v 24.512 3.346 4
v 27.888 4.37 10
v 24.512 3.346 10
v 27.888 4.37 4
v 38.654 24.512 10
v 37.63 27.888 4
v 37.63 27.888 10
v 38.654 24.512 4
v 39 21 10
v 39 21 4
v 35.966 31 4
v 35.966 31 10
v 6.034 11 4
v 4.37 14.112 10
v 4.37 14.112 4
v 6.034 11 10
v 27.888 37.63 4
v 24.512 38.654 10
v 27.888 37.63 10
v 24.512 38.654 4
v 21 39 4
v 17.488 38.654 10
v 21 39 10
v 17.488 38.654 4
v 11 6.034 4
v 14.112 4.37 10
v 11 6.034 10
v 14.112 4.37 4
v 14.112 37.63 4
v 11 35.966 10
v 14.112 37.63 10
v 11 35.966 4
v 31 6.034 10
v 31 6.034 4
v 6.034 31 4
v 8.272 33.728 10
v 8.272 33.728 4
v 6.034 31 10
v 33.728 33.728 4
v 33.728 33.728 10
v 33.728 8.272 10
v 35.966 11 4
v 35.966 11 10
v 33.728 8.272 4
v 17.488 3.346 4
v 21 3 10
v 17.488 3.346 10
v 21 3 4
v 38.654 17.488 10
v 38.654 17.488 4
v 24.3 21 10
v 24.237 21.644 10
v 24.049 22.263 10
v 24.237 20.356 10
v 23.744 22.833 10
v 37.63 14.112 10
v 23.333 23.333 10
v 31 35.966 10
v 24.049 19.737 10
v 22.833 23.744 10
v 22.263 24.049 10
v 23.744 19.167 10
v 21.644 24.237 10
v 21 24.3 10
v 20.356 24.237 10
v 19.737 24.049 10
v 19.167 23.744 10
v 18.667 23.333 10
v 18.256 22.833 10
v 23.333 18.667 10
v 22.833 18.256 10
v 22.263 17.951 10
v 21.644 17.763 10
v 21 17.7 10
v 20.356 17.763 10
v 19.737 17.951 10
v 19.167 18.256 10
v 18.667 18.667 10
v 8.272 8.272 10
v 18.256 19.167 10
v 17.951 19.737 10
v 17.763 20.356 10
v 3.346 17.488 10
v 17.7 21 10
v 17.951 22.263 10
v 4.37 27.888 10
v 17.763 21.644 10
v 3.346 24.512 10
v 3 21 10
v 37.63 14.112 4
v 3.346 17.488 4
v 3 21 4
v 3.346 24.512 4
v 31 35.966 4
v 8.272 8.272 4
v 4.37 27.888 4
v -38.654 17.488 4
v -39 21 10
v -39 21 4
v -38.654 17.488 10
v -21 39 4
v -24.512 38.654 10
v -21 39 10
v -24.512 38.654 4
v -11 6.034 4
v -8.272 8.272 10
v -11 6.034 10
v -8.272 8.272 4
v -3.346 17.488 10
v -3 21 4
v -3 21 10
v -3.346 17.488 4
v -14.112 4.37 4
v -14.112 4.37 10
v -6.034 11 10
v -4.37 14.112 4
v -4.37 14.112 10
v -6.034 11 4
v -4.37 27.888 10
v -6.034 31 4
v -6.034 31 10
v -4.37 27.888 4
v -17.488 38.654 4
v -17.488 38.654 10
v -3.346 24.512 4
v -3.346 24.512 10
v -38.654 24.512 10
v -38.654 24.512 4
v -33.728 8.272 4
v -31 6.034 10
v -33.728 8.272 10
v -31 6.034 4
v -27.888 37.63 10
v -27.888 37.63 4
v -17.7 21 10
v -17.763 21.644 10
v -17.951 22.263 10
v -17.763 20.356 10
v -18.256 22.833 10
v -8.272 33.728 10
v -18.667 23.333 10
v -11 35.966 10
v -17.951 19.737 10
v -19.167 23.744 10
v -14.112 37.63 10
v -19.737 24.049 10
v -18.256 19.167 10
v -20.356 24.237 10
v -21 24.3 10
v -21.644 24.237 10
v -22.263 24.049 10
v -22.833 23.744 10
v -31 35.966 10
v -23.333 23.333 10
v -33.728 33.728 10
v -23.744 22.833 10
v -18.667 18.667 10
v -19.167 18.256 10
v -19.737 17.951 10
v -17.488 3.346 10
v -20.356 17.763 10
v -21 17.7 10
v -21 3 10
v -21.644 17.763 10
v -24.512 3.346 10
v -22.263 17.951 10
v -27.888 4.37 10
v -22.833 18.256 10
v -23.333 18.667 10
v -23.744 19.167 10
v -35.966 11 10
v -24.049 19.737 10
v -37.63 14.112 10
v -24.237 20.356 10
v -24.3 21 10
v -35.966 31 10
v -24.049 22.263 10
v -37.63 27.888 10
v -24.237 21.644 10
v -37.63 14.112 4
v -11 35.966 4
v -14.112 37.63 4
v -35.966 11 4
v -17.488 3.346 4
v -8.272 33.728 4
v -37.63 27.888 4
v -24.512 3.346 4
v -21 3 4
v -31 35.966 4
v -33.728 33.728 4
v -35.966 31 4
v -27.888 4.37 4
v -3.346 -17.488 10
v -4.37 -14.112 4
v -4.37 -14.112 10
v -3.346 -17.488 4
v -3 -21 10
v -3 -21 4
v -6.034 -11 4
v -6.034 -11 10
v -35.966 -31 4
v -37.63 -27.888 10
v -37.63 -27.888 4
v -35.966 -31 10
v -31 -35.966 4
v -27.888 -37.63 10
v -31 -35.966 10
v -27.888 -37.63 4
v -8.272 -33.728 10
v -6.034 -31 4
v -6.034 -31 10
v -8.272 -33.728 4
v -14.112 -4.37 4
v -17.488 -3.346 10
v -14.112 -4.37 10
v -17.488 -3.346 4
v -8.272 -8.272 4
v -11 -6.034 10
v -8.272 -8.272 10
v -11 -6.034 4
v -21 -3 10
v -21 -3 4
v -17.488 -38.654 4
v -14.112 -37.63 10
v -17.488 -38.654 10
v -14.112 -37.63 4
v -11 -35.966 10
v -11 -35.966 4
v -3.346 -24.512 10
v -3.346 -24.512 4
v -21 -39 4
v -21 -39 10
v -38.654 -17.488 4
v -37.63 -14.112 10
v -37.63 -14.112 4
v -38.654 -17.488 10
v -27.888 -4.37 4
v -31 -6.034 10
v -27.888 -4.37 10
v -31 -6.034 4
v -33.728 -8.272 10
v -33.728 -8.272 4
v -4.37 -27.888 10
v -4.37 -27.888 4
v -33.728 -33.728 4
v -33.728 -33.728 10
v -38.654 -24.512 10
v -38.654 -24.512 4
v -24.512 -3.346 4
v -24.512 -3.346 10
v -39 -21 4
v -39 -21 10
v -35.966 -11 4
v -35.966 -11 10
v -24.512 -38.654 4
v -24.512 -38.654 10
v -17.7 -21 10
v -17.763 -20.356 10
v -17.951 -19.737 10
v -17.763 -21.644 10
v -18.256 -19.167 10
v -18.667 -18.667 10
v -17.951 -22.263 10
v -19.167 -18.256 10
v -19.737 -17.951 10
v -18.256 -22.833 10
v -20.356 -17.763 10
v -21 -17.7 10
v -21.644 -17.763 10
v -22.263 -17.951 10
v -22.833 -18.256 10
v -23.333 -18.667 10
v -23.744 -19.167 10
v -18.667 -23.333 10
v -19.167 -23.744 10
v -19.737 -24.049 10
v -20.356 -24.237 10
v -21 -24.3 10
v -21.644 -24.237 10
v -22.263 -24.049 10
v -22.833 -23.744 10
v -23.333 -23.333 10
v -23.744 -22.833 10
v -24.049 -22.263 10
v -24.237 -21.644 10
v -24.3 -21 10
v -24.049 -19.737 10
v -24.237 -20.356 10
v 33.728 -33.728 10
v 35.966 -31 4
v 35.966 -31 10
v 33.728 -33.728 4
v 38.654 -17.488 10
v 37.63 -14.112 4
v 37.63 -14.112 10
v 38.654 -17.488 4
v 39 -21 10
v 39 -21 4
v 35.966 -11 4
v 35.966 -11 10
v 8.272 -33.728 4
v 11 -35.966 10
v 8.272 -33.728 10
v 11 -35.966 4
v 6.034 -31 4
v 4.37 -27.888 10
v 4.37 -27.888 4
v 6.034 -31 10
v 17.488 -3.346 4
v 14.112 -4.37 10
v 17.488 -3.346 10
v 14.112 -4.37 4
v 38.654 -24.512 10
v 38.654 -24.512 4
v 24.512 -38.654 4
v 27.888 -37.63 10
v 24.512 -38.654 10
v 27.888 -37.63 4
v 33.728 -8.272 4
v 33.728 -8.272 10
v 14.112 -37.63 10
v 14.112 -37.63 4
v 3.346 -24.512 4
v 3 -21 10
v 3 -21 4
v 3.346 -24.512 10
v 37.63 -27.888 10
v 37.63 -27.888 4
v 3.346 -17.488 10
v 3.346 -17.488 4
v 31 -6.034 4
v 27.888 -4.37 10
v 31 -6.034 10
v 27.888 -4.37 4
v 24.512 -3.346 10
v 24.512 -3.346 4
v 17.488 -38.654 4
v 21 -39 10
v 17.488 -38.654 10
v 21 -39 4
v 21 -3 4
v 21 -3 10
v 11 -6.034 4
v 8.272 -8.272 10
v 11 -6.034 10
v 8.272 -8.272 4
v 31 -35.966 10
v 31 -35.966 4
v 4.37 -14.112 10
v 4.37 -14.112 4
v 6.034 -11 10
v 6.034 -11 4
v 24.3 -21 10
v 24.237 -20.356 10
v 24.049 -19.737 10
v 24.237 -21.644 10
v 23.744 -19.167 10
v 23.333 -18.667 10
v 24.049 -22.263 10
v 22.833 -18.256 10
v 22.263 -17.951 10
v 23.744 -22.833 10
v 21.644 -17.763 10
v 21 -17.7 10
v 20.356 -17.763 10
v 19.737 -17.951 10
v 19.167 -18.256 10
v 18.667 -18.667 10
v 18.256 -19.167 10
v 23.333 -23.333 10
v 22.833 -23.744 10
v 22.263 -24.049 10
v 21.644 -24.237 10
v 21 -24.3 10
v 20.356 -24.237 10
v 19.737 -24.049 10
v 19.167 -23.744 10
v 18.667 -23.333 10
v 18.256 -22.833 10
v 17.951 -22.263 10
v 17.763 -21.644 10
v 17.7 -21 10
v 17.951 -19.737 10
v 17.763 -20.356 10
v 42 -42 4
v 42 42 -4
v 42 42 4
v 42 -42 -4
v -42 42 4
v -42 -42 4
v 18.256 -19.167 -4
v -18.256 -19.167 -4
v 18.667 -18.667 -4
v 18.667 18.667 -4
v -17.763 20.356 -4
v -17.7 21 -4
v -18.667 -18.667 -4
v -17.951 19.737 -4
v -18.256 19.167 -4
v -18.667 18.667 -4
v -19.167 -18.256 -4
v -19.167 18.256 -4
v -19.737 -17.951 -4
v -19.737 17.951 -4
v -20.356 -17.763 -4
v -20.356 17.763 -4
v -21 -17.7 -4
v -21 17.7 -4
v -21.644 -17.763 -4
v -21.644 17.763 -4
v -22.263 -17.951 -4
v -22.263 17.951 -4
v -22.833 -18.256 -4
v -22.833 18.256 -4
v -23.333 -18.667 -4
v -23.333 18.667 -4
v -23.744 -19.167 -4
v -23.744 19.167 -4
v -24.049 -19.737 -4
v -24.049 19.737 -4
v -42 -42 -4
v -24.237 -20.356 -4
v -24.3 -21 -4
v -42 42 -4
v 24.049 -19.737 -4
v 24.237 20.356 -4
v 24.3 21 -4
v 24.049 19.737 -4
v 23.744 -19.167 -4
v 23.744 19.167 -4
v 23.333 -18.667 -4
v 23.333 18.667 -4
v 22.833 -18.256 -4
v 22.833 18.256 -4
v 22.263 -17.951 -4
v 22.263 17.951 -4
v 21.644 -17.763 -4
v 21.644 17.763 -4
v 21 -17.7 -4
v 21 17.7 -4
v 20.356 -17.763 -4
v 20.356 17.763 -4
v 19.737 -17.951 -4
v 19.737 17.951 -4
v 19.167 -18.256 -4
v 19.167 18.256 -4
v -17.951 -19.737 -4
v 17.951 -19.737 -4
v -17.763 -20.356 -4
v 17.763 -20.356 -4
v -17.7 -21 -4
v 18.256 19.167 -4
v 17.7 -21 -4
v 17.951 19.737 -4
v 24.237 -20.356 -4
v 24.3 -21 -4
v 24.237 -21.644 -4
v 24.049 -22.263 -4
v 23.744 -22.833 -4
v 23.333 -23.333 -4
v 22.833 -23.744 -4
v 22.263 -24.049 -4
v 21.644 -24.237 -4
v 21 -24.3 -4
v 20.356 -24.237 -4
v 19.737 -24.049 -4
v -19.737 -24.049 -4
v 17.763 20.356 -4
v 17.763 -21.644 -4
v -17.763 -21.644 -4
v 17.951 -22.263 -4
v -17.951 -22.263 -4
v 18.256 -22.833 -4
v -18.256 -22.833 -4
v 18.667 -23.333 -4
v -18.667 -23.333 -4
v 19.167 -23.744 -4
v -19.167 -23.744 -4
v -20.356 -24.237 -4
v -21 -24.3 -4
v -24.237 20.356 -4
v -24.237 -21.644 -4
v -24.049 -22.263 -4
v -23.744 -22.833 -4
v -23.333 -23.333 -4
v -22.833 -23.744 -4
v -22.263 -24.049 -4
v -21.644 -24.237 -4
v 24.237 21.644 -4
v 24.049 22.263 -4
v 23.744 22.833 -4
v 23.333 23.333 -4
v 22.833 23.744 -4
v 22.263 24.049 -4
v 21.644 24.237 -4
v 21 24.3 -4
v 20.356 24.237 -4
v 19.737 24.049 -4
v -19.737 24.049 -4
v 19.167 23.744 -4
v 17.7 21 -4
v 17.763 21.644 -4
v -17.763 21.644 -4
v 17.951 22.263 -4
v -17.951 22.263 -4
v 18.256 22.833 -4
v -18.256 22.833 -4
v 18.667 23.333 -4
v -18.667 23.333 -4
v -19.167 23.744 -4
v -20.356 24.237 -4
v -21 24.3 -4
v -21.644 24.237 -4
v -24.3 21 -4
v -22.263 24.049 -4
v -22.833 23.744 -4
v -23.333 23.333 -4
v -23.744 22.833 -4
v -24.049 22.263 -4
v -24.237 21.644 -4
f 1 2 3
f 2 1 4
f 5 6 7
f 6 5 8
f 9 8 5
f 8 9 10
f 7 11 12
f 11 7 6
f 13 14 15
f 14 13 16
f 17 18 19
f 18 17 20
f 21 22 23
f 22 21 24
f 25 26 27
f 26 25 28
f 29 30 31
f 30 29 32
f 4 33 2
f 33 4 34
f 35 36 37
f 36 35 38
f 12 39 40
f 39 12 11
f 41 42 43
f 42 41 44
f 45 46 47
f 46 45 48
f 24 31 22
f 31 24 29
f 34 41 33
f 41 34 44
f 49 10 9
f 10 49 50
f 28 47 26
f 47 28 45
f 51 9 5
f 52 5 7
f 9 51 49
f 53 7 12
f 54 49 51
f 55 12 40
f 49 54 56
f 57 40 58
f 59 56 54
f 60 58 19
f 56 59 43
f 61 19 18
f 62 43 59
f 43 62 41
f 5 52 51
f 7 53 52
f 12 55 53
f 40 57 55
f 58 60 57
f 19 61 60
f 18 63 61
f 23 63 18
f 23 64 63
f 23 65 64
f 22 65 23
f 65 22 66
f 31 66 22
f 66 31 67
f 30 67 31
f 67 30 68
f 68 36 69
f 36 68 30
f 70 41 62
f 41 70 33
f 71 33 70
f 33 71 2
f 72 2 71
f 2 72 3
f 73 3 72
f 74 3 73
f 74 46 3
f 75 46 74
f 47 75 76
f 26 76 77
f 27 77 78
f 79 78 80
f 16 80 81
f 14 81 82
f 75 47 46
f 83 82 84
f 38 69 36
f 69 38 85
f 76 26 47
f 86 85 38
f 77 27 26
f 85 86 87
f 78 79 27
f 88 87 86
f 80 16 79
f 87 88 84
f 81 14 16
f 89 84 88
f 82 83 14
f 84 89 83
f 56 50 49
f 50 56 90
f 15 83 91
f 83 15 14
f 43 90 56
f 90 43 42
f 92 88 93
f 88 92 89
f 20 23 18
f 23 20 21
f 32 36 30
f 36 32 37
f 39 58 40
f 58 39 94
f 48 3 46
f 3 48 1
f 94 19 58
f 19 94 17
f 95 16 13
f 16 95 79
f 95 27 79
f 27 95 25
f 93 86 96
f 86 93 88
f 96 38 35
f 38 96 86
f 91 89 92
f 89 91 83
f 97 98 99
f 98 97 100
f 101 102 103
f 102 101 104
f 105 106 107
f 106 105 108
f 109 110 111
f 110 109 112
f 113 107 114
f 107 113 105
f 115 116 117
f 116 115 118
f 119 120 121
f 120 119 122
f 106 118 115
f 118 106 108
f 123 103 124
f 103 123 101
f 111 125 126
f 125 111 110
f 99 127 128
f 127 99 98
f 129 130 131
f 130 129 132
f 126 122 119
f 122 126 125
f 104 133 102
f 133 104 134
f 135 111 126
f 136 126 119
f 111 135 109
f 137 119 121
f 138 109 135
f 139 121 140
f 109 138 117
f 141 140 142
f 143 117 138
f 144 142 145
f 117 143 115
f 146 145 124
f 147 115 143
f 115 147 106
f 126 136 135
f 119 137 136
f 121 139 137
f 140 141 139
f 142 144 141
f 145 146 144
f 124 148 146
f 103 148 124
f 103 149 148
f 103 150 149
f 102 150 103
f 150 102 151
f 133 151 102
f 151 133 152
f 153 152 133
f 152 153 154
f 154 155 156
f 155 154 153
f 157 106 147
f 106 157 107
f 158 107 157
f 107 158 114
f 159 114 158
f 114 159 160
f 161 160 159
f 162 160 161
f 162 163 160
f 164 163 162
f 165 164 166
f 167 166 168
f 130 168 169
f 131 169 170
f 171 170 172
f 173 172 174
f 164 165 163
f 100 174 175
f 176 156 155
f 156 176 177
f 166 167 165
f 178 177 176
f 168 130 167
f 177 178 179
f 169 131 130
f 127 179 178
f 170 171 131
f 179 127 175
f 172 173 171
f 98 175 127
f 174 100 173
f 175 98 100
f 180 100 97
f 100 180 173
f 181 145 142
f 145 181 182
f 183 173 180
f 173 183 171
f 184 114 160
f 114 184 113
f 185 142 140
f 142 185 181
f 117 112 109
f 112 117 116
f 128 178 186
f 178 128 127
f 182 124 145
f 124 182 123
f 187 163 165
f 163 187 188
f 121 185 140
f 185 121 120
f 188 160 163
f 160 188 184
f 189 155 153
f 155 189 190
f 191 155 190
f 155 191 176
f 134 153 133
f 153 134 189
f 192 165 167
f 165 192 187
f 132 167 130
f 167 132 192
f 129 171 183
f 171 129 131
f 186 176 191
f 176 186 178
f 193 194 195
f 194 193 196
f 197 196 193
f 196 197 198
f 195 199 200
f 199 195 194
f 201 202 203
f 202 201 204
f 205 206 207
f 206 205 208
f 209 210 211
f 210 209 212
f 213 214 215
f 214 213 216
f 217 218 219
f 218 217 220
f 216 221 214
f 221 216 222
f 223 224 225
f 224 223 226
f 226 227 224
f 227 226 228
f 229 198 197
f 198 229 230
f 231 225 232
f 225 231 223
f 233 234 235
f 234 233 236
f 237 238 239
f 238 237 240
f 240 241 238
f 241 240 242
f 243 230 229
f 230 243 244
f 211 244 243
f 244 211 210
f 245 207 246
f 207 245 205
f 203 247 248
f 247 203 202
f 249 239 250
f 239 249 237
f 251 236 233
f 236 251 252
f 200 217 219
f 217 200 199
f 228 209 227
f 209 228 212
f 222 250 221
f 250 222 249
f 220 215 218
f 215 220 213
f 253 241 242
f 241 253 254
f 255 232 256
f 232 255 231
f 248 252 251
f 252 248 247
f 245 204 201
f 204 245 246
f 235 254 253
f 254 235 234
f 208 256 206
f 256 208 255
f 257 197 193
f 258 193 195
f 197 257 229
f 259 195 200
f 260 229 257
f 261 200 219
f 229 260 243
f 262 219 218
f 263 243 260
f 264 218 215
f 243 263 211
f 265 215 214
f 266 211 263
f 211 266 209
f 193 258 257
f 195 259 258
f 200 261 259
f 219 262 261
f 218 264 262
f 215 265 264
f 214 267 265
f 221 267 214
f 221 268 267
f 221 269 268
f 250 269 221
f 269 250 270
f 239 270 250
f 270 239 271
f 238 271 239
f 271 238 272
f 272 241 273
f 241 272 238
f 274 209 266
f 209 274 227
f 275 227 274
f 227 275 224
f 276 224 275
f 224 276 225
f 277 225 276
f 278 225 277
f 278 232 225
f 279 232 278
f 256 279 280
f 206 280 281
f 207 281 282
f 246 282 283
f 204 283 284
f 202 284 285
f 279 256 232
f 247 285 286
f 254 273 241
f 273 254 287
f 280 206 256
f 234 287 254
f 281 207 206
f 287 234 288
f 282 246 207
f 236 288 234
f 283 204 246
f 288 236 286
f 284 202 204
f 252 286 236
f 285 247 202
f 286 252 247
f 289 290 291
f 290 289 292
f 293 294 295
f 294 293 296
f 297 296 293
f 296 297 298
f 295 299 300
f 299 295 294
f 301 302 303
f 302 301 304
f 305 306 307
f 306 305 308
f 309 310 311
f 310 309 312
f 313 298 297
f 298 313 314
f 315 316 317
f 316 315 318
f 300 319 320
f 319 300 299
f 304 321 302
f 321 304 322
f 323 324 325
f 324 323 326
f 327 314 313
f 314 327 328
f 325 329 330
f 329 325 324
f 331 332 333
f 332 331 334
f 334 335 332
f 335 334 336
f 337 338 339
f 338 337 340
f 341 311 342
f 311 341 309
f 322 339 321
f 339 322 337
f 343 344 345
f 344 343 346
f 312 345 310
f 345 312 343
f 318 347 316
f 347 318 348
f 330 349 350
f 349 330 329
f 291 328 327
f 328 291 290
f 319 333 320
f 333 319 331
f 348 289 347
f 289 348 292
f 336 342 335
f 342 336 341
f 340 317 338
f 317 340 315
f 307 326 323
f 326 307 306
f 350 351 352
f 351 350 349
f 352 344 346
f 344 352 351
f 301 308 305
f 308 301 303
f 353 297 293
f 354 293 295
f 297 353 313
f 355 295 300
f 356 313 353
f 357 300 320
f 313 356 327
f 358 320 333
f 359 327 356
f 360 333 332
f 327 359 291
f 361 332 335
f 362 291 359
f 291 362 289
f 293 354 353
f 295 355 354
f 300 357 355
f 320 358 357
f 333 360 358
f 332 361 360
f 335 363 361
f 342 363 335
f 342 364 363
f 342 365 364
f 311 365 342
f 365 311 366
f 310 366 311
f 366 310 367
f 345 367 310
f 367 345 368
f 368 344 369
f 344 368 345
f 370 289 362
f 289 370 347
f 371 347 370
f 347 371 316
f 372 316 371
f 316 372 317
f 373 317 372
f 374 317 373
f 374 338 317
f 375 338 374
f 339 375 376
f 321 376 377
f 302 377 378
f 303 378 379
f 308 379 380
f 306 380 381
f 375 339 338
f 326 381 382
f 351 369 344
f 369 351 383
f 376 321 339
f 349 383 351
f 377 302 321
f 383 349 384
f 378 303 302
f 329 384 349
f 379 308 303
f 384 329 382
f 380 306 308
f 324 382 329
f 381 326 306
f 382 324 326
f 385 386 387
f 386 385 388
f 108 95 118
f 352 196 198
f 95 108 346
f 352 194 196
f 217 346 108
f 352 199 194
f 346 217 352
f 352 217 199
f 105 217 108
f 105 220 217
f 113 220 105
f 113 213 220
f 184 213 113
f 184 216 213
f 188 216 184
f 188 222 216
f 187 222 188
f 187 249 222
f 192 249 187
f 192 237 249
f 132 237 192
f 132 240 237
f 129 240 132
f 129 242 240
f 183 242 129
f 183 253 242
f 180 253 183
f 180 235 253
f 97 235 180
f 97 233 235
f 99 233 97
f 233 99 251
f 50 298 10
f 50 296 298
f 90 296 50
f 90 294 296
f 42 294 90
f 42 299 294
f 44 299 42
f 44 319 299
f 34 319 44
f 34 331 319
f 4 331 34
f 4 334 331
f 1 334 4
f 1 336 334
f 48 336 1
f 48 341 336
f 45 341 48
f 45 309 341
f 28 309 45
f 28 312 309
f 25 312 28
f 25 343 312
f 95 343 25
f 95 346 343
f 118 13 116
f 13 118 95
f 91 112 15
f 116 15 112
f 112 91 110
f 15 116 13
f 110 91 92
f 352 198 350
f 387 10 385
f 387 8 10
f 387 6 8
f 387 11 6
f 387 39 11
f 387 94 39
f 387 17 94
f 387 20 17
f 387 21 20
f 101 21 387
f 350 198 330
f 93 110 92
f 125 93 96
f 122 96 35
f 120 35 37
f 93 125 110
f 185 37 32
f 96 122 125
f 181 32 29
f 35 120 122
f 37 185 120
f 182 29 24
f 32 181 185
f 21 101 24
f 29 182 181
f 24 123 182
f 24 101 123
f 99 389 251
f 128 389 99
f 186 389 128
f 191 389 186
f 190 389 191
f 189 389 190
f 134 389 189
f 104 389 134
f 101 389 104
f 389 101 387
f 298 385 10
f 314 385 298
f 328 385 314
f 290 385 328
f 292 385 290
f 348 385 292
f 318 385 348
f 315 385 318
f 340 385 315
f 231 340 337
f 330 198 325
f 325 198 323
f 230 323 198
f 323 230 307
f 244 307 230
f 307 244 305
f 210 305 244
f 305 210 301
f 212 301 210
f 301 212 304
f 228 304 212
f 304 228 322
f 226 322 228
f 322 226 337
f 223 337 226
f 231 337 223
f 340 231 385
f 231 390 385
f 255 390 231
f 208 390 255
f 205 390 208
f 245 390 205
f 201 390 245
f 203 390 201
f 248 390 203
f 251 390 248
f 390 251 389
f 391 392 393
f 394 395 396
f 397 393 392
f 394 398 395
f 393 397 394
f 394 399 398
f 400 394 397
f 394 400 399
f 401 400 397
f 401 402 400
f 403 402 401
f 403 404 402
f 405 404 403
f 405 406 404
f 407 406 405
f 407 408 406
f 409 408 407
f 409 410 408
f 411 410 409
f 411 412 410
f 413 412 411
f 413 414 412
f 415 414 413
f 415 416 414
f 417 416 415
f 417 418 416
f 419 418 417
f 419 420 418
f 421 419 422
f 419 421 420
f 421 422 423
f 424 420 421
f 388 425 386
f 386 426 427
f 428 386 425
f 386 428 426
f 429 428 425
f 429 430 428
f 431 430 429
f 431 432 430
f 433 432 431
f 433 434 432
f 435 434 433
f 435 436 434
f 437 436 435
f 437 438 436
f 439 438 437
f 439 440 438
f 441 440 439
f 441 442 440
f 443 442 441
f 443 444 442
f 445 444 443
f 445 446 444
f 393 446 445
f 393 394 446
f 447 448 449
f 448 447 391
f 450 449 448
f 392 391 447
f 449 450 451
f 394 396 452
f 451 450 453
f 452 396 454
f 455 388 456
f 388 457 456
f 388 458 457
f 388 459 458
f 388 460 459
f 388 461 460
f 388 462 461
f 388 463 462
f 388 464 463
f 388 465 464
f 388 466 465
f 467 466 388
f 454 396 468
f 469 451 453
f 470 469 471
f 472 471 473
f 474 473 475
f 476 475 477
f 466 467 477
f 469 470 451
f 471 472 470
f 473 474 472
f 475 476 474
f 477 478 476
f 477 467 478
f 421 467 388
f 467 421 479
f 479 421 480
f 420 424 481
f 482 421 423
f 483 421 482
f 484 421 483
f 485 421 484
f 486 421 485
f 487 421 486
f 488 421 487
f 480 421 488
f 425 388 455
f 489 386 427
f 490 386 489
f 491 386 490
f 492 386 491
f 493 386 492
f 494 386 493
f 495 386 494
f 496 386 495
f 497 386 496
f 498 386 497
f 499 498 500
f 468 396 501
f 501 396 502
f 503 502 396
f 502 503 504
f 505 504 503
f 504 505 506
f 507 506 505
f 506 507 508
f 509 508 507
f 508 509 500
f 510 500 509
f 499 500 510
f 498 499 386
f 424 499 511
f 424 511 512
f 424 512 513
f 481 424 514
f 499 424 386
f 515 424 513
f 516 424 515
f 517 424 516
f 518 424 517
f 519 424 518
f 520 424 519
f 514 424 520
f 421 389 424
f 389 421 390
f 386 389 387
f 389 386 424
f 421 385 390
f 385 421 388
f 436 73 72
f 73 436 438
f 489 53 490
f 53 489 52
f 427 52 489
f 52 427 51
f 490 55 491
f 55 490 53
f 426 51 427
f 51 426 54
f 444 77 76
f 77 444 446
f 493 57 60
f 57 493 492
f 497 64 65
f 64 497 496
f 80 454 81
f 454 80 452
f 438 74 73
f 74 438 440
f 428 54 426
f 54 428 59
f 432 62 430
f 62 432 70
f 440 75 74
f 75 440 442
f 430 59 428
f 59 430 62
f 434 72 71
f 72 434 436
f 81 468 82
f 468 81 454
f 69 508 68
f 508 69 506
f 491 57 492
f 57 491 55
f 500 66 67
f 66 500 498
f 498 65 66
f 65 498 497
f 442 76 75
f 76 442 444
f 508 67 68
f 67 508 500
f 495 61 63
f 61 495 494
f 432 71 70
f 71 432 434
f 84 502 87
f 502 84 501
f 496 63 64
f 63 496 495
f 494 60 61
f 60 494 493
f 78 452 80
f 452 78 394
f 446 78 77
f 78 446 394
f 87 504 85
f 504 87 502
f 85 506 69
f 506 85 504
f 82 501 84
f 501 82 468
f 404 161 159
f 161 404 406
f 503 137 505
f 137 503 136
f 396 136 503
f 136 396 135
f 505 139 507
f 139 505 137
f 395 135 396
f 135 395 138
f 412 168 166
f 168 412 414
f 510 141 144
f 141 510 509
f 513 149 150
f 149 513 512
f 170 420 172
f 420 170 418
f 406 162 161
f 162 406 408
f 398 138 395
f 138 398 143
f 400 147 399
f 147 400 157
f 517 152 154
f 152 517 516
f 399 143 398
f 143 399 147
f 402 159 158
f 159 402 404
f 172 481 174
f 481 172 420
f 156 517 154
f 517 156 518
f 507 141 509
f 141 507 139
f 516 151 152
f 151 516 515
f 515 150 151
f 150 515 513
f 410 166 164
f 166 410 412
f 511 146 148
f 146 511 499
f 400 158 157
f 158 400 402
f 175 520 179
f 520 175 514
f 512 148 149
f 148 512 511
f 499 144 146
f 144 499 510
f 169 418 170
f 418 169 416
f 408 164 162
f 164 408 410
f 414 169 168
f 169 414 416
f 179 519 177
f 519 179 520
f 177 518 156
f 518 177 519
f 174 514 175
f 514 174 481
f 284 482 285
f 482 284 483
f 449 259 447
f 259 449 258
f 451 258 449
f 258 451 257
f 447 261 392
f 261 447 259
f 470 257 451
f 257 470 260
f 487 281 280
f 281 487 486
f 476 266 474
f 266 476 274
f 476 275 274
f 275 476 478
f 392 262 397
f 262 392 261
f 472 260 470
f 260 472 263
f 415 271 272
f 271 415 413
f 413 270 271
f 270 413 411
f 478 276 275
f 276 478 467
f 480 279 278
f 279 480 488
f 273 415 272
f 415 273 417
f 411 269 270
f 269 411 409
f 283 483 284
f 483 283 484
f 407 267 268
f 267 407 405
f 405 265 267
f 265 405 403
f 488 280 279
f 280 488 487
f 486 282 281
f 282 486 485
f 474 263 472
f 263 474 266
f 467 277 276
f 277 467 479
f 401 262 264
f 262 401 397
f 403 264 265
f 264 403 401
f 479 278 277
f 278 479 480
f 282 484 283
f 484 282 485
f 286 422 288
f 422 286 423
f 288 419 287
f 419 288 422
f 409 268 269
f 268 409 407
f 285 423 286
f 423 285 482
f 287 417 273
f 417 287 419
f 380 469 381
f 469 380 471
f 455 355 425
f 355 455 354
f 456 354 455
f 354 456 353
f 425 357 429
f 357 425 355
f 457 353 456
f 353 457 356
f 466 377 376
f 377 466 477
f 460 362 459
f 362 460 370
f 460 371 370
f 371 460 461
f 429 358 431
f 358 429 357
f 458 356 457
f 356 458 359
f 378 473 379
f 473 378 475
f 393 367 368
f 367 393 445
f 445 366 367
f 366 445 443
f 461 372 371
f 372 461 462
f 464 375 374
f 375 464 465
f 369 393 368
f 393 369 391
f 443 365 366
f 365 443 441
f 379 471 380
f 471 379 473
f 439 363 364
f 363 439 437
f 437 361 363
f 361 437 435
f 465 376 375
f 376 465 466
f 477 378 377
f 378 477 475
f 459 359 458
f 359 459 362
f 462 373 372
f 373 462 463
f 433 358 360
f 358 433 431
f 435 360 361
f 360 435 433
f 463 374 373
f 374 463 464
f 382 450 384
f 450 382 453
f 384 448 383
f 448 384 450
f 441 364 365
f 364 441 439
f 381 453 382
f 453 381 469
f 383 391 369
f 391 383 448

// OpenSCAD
$fn = 32;

// ----------------------------------------------------------------------
// Anchor pads 84 x 84 x 14
// four corner bosses with anchor holes
// ----------------------------------------------------------------------

// --- parameters (mm) ---
plate = [84, 84, 8];  // base plate size (x, y, z)
pads = 4;             // boss count, one per corner
edge = 21;            // boss centre offset from the plate edge
boss_d = 36;          // boss diameter
boss_h = 6;           // boss height above the base plate
hole_d = 6.6;         // hole diameter

// --- derived feature positions (mm) ---
height = plate[2] + boss_h;      // = 14   overall height of the part
corner_x = plate[0] / 2 - edge;  // = 21   boss centre X
corner_y = plate[1] / 2 - edge;  // = 21   boss centre Y
feature_centers = [
  [corner_x, corner_y],
  [-corner_x, corner_y],
  [-corner_x, -corner_y],
  [corner_x, -corner_y]
];   // boss centres, anchor holes are drilled there

// base plate, four bosses standing on it, anchor holes all the way through
difference() {
  union() {
    cube(plate, center = true);
    for (centre = feature_centers)
      translate([centre[0], centre[1], plate[2] / 2 - 1])
        cylinder(d = boss_d, h = boss_h + 1);
  }
  for (centre = feature_centers)
    translate([centre[0], centre[1], -height])
      cylinder(d = hole_d, h = 2 * height + 2);  // through boss and plate
}
